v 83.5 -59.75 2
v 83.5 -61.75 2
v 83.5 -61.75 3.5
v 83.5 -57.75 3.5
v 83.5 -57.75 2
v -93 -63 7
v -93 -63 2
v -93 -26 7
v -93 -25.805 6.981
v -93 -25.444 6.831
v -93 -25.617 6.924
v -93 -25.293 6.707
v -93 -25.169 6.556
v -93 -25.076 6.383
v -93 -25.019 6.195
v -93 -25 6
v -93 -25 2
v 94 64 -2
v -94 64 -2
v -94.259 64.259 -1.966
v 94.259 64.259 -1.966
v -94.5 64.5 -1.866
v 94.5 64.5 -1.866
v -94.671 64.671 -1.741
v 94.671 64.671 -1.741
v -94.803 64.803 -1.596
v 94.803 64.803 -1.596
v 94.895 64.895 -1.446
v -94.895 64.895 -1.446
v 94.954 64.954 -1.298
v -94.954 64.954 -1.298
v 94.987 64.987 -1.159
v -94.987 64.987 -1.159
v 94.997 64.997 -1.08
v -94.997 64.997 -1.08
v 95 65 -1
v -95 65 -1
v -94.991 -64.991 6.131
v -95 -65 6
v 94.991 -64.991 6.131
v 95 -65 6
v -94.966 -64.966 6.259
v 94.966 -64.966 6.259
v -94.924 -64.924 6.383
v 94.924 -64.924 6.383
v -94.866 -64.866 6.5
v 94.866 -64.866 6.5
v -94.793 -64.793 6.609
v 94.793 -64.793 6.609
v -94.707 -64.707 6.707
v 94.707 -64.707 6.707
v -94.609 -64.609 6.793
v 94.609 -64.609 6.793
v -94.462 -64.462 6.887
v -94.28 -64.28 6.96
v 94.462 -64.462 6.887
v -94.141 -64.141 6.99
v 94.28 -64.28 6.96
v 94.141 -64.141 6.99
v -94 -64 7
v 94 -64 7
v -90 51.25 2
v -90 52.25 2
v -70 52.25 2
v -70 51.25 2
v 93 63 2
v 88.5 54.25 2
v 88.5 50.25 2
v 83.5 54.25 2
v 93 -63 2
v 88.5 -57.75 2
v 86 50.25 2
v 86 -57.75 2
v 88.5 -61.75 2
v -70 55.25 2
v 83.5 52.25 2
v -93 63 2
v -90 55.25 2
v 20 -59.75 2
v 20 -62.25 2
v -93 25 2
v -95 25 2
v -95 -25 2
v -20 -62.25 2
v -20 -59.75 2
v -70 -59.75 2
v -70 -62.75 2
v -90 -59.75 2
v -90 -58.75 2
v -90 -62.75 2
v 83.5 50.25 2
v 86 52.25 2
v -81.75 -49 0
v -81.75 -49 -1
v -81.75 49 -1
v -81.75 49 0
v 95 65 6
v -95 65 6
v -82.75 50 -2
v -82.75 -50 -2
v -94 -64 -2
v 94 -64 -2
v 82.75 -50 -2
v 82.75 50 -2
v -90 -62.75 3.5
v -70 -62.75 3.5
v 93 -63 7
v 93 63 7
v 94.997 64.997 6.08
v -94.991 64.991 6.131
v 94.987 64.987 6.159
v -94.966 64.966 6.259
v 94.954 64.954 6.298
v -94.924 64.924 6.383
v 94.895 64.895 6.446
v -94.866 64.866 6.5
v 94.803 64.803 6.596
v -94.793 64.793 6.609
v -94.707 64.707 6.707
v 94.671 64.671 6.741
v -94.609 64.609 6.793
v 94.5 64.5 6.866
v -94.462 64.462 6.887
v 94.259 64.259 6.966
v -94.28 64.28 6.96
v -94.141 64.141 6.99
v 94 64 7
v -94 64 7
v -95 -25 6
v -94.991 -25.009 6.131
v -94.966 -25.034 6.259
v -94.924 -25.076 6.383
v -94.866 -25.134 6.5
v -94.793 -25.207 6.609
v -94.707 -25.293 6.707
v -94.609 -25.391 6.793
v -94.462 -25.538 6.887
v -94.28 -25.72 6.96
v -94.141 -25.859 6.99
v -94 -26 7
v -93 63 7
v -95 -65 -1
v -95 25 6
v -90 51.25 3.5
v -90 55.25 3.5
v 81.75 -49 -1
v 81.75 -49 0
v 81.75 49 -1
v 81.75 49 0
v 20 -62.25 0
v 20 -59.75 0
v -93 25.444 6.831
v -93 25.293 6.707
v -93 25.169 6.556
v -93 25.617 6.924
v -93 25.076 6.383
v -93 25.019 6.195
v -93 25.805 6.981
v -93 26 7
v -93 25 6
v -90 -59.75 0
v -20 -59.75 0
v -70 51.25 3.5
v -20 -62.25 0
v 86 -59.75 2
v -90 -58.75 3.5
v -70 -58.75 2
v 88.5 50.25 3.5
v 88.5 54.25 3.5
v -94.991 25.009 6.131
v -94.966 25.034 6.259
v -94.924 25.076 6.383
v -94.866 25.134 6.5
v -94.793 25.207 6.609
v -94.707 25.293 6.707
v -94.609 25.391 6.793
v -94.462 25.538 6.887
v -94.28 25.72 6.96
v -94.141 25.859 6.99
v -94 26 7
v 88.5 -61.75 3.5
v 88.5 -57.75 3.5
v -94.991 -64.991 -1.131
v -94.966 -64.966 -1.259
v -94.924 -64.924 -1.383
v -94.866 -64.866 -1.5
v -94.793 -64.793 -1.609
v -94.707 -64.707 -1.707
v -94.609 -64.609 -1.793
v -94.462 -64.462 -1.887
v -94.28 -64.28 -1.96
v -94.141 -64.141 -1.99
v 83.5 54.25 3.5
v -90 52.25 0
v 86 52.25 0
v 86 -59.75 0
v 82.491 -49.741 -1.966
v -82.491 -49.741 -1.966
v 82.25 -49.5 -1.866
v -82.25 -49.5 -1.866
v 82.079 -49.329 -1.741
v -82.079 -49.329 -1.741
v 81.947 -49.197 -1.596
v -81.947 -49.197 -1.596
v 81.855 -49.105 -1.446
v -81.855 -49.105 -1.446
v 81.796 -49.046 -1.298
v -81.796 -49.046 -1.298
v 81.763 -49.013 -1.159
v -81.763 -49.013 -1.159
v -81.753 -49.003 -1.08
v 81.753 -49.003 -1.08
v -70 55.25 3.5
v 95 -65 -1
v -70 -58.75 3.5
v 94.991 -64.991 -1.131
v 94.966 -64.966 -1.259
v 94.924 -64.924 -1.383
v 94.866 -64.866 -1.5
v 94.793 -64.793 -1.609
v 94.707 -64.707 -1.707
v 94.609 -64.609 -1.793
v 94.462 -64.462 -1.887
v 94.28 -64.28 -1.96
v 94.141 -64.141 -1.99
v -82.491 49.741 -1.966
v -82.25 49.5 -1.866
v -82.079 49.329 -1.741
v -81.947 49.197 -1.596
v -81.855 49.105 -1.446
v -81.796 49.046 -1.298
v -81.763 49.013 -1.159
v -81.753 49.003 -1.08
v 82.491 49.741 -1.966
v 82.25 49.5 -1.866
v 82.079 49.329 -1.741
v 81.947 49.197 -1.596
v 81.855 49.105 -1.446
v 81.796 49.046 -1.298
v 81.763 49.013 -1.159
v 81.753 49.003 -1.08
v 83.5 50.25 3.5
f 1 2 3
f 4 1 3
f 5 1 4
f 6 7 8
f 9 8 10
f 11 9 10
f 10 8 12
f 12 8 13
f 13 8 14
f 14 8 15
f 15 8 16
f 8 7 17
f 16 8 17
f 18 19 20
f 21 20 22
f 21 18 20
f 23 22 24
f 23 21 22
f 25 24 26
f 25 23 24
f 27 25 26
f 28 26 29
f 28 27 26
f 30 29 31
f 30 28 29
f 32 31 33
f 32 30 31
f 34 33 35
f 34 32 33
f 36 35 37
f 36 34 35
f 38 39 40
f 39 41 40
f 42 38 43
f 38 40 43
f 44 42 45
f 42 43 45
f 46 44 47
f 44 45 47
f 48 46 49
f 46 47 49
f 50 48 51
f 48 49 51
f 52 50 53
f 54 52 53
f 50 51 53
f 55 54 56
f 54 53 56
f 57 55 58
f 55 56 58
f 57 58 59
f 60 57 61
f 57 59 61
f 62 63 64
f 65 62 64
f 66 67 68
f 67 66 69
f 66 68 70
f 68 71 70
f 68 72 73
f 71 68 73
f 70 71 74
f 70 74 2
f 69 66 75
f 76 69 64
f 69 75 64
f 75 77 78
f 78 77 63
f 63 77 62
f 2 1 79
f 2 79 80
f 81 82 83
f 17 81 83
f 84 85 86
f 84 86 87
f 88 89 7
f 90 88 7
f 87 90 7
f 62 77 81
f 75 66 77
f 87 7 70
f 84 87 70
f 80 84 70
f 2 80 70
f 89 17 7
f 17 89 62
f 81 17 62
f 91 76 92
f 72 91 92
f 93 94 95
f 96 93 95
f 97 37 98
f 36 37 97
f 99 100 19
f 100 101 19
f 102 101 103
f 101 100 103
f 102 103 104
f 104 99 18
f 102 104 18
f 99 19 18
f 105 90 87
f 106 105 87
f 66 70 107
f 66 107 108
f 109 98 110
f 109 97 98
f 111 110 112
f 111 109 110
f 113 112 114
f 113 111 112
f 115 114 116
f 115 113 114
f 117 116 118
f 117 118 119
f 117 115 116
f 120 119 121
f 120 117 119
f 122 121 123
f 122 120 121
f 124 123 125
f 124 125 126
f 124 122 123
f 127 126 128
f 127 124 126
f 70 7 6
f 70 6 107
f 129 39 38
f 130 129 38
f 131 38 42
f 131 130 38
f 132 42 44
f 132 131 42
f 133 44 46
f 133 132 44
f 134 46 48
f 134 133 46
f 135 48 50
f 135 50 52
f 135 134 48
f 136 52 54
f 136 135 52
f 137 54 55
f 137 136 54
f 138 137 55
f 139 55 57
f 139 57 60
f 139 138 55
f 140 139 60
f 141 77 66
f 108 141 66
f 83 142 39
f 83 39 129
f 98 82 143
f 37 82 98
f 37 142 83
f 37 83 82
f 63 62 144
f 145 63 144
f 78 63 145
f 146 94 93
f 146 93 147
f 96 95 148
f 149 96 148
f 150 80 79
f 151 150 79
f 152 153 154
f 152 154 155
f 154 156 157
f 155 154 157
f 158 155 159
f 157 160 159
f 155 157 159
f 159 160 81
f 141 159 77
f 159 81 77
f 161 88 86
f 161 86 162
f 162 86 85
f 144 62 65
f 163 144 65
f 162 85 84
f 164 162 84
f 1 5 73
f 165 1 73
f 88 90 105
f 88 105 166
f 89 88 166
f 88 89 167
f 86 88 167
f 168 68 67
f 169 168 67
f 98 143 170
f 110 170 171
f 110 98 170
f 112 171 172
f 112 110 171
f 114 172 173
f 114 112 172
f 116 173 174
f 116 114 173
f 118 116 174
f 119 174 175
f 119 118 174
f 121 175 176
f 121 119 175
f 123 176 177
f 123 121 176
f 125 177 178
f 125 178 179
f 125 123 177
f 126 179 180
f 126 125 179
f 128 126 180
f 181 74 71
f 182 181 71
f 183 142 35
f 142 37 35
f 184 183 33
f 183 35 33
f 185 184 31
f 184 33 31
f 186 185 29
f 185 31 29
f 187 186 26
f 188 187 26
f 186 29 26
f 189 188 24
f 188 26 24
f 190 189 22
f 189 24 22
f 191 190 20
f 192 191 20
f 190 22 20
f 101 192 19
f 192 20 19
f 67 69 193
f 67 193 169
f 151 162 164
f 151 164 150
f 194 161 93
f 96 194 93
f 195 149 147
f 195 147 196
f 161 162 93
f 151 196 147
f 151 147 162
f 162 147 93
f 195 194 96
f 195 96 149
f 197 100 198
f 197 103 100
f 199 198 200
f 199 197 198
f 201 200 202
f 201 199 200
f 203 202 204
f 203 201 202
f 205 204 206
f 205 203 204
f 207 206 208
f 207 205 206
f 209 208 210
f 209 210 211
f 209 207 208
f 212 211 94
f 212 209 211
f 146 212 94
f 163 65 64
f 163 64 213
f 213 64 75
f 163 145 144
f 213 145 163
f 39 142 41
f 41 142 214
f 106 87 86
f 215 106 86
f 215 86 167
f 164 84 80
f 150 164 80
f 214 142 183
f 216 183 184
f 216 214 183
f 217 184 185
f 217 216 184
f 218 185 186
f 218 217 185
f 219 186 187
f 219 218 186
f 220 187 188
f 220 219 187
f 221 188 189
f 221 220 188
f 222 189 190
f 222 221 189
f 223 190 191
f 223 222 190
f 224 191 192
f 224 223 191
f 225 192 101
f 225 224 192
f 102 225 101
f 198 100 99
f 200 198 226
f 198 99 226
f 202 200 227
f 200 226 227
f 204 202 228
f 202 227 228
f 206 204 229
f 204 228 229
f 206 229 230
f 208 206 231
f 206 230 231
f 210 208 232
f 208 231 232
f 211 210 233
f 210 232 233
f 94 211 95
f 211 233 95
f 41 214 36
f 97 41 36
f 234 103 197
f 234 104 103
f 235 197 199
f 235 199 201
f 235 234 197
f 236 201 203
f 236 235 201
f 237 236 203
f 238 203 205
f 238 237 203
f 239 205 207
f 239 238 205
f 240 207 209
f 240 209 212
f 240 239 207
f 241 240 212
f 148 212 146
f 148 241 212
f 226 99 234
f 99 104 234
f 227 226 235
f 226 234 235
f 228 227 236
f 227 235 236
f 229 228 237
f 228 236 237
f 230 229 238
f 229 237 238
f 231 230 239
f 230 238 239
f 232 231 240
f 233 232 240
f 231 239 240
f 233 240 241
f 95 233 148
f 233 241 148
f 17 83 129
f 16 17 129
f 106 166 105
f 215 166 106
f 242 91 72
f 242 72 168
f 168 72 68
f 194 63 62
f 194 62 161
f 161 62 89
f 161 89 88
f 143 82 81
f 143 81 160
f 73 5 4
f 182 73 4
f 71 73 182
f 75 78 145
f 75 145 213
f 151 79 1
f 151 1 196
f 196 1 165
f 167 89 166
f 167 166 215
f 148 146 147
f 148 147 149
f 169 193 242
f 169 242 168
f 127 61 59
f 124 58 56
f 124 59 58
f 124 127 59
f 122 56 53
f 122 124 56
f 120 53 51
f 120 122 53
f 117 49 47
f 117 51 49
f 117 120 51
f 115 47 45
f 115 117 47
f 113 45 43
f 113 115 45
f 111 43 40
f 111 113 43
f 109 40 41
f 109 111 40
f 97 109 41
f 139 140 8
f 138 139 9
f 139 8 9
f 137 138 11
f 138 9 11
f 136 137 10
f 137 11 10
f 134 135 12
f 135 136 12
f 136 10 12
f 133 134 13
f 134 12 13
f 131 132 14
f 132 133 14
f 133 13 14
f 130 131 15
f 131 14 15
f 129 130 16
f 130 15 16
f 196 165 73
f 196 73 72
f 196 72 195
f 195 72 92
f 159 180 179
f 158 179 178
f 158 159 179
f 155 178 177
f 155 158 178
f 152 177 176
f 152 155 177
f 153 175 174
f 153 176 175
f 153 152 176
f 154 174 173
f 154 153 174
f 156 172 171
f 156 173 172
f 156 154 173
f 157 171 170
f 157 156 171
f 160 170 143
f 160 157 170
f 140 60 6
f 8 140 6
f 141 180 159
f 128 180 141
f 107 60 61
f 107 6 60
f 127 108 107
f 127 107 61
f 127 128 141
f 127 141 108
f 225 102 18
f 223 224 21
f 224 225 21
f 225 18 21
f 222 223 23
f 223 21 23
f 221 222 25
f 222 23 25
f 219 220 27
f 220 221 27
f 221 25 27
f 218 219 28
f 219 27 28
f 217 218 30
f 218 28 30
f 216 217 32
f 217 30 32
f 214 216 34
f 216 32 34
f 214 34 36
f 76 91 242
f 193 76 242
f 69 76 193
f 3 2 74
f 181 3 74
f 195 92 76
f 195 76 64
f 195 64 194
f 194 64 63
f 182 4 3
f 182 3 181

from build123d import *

# Parameters (mm, degrees)
SKETCH_W        = 190
SKETCH_H        = 130
SKETCH_W_2      = 163.5
SKETCH_H_2      = 98
PAD_DEPTH       = 4
SKETCH005_W     = 190
SKETCH005_H     = 130
SKETCH005_W_2   = 186
SKETCH005_H_2   = 126
PAD002_DEPTH    = 5
POCKET_DEPTH    = 2
SKETCH006_W     = 50
SKETCH006_H     = 5
POCKET001_DEPTH = 2
FILLET_R        = 1
SKETCH010_W     = 20
SKETCH010_H     = 4
SKETCH010_W_2   = 5
PAD005_DEPTH    = 1.5


with BuildPart() as part:
    # Sketch (on DatumPlane) → Pad (new body)
    with BuildSketch(Plane.XY.offset(-2)):
        Rectangle(SKETCH_W, SKETCH_H)
        Rectangle(SKETCH_W_2, SKETCH_H_2, mode=Mode.SUBTRACT)
    extrude(amount=PAD_DEPTH)

    # Sketch005 → Pad002 (join)
    with BuildSketch(Plane.XY.offset(2)):
        Rectangle(SKETCH005_W, SKETCH005_H)
        Rectangle(SKETCH005_W_2, SKETCH005_H_2, mode=Mode.SUBTRACT)
    extrude(amount=PAD002_DEPTH)

    # Sketch003 (on Face10 of Pad) → Pocket (cut)
    with BuildSketch(Plane.XY.offset(2)):
        Polygon((-90, 52.25), (-90, -59.75), (-20, -59.75), (-20, -62.25), (20, -62.25), (20, -59.75), (86, -59.75), (86, 52.25), align=None)
    extrude(amount=-POCKET_DEPTH, mode=Mode.SUBTRACT)

    # Sketch006 (on Face2 of Pocket) → Pocket001 (cut)
    with BuildSketch(Plane(origin=(-95, 0, 0), x_dir=(0, -1, 0), z_dir=(-1, 0, 0))):
        with Locations((0, 4.5)):
            Rectangle(SKETCH006_W, SKETCH006_H)
    extrude(amount=-POCKET001_DEPTH, mode=Mode.SUBTRACT)

    # Fillet
    fillet_edges = [part.edges().sort_by_distance(p)[0] for p in [
        (0, -65, -2),
        (95, 0, -2),
        (0, 65, -2),
        (0, -49, -2),
        (81.75, 0, -2),
        (-81.75, 0, -2),
        (0, 49, -2),
        (-95, 0, -2),
        (-95, -45, 7),
        (0, -65, 7),
        (95, 0, 7),
        (0, 65, 7),
        (-95, 45, 7),
        (-94, 25, 7),
        (-94, -25, 7),
    ]]
    fillet(fillet_edges, radius=FILLET_R)

    # Sketch010 (on Face23 of Fillet) → Pad005 (join)
    with BuildSketch(Plane.XY.offset(2)):
        with Locations((-80, 53.25)):
            Rectangle(SKETCH010_W, SKETCH010_H)
        with Locations((-80, -60.75)):
            Rectangle(SKETCH010_W, SKETCH010_H)
        with Locations((86, 52.25)):
            Rectangle(SKETCH010_W_2, SKETCH010_H)
        with Locations((86, -59.75)):
            Rectangle(SKETCH010_W_2, SKETCH010_H)
    extrude(amount=PAD005_DEPTH)


solid = part.part
